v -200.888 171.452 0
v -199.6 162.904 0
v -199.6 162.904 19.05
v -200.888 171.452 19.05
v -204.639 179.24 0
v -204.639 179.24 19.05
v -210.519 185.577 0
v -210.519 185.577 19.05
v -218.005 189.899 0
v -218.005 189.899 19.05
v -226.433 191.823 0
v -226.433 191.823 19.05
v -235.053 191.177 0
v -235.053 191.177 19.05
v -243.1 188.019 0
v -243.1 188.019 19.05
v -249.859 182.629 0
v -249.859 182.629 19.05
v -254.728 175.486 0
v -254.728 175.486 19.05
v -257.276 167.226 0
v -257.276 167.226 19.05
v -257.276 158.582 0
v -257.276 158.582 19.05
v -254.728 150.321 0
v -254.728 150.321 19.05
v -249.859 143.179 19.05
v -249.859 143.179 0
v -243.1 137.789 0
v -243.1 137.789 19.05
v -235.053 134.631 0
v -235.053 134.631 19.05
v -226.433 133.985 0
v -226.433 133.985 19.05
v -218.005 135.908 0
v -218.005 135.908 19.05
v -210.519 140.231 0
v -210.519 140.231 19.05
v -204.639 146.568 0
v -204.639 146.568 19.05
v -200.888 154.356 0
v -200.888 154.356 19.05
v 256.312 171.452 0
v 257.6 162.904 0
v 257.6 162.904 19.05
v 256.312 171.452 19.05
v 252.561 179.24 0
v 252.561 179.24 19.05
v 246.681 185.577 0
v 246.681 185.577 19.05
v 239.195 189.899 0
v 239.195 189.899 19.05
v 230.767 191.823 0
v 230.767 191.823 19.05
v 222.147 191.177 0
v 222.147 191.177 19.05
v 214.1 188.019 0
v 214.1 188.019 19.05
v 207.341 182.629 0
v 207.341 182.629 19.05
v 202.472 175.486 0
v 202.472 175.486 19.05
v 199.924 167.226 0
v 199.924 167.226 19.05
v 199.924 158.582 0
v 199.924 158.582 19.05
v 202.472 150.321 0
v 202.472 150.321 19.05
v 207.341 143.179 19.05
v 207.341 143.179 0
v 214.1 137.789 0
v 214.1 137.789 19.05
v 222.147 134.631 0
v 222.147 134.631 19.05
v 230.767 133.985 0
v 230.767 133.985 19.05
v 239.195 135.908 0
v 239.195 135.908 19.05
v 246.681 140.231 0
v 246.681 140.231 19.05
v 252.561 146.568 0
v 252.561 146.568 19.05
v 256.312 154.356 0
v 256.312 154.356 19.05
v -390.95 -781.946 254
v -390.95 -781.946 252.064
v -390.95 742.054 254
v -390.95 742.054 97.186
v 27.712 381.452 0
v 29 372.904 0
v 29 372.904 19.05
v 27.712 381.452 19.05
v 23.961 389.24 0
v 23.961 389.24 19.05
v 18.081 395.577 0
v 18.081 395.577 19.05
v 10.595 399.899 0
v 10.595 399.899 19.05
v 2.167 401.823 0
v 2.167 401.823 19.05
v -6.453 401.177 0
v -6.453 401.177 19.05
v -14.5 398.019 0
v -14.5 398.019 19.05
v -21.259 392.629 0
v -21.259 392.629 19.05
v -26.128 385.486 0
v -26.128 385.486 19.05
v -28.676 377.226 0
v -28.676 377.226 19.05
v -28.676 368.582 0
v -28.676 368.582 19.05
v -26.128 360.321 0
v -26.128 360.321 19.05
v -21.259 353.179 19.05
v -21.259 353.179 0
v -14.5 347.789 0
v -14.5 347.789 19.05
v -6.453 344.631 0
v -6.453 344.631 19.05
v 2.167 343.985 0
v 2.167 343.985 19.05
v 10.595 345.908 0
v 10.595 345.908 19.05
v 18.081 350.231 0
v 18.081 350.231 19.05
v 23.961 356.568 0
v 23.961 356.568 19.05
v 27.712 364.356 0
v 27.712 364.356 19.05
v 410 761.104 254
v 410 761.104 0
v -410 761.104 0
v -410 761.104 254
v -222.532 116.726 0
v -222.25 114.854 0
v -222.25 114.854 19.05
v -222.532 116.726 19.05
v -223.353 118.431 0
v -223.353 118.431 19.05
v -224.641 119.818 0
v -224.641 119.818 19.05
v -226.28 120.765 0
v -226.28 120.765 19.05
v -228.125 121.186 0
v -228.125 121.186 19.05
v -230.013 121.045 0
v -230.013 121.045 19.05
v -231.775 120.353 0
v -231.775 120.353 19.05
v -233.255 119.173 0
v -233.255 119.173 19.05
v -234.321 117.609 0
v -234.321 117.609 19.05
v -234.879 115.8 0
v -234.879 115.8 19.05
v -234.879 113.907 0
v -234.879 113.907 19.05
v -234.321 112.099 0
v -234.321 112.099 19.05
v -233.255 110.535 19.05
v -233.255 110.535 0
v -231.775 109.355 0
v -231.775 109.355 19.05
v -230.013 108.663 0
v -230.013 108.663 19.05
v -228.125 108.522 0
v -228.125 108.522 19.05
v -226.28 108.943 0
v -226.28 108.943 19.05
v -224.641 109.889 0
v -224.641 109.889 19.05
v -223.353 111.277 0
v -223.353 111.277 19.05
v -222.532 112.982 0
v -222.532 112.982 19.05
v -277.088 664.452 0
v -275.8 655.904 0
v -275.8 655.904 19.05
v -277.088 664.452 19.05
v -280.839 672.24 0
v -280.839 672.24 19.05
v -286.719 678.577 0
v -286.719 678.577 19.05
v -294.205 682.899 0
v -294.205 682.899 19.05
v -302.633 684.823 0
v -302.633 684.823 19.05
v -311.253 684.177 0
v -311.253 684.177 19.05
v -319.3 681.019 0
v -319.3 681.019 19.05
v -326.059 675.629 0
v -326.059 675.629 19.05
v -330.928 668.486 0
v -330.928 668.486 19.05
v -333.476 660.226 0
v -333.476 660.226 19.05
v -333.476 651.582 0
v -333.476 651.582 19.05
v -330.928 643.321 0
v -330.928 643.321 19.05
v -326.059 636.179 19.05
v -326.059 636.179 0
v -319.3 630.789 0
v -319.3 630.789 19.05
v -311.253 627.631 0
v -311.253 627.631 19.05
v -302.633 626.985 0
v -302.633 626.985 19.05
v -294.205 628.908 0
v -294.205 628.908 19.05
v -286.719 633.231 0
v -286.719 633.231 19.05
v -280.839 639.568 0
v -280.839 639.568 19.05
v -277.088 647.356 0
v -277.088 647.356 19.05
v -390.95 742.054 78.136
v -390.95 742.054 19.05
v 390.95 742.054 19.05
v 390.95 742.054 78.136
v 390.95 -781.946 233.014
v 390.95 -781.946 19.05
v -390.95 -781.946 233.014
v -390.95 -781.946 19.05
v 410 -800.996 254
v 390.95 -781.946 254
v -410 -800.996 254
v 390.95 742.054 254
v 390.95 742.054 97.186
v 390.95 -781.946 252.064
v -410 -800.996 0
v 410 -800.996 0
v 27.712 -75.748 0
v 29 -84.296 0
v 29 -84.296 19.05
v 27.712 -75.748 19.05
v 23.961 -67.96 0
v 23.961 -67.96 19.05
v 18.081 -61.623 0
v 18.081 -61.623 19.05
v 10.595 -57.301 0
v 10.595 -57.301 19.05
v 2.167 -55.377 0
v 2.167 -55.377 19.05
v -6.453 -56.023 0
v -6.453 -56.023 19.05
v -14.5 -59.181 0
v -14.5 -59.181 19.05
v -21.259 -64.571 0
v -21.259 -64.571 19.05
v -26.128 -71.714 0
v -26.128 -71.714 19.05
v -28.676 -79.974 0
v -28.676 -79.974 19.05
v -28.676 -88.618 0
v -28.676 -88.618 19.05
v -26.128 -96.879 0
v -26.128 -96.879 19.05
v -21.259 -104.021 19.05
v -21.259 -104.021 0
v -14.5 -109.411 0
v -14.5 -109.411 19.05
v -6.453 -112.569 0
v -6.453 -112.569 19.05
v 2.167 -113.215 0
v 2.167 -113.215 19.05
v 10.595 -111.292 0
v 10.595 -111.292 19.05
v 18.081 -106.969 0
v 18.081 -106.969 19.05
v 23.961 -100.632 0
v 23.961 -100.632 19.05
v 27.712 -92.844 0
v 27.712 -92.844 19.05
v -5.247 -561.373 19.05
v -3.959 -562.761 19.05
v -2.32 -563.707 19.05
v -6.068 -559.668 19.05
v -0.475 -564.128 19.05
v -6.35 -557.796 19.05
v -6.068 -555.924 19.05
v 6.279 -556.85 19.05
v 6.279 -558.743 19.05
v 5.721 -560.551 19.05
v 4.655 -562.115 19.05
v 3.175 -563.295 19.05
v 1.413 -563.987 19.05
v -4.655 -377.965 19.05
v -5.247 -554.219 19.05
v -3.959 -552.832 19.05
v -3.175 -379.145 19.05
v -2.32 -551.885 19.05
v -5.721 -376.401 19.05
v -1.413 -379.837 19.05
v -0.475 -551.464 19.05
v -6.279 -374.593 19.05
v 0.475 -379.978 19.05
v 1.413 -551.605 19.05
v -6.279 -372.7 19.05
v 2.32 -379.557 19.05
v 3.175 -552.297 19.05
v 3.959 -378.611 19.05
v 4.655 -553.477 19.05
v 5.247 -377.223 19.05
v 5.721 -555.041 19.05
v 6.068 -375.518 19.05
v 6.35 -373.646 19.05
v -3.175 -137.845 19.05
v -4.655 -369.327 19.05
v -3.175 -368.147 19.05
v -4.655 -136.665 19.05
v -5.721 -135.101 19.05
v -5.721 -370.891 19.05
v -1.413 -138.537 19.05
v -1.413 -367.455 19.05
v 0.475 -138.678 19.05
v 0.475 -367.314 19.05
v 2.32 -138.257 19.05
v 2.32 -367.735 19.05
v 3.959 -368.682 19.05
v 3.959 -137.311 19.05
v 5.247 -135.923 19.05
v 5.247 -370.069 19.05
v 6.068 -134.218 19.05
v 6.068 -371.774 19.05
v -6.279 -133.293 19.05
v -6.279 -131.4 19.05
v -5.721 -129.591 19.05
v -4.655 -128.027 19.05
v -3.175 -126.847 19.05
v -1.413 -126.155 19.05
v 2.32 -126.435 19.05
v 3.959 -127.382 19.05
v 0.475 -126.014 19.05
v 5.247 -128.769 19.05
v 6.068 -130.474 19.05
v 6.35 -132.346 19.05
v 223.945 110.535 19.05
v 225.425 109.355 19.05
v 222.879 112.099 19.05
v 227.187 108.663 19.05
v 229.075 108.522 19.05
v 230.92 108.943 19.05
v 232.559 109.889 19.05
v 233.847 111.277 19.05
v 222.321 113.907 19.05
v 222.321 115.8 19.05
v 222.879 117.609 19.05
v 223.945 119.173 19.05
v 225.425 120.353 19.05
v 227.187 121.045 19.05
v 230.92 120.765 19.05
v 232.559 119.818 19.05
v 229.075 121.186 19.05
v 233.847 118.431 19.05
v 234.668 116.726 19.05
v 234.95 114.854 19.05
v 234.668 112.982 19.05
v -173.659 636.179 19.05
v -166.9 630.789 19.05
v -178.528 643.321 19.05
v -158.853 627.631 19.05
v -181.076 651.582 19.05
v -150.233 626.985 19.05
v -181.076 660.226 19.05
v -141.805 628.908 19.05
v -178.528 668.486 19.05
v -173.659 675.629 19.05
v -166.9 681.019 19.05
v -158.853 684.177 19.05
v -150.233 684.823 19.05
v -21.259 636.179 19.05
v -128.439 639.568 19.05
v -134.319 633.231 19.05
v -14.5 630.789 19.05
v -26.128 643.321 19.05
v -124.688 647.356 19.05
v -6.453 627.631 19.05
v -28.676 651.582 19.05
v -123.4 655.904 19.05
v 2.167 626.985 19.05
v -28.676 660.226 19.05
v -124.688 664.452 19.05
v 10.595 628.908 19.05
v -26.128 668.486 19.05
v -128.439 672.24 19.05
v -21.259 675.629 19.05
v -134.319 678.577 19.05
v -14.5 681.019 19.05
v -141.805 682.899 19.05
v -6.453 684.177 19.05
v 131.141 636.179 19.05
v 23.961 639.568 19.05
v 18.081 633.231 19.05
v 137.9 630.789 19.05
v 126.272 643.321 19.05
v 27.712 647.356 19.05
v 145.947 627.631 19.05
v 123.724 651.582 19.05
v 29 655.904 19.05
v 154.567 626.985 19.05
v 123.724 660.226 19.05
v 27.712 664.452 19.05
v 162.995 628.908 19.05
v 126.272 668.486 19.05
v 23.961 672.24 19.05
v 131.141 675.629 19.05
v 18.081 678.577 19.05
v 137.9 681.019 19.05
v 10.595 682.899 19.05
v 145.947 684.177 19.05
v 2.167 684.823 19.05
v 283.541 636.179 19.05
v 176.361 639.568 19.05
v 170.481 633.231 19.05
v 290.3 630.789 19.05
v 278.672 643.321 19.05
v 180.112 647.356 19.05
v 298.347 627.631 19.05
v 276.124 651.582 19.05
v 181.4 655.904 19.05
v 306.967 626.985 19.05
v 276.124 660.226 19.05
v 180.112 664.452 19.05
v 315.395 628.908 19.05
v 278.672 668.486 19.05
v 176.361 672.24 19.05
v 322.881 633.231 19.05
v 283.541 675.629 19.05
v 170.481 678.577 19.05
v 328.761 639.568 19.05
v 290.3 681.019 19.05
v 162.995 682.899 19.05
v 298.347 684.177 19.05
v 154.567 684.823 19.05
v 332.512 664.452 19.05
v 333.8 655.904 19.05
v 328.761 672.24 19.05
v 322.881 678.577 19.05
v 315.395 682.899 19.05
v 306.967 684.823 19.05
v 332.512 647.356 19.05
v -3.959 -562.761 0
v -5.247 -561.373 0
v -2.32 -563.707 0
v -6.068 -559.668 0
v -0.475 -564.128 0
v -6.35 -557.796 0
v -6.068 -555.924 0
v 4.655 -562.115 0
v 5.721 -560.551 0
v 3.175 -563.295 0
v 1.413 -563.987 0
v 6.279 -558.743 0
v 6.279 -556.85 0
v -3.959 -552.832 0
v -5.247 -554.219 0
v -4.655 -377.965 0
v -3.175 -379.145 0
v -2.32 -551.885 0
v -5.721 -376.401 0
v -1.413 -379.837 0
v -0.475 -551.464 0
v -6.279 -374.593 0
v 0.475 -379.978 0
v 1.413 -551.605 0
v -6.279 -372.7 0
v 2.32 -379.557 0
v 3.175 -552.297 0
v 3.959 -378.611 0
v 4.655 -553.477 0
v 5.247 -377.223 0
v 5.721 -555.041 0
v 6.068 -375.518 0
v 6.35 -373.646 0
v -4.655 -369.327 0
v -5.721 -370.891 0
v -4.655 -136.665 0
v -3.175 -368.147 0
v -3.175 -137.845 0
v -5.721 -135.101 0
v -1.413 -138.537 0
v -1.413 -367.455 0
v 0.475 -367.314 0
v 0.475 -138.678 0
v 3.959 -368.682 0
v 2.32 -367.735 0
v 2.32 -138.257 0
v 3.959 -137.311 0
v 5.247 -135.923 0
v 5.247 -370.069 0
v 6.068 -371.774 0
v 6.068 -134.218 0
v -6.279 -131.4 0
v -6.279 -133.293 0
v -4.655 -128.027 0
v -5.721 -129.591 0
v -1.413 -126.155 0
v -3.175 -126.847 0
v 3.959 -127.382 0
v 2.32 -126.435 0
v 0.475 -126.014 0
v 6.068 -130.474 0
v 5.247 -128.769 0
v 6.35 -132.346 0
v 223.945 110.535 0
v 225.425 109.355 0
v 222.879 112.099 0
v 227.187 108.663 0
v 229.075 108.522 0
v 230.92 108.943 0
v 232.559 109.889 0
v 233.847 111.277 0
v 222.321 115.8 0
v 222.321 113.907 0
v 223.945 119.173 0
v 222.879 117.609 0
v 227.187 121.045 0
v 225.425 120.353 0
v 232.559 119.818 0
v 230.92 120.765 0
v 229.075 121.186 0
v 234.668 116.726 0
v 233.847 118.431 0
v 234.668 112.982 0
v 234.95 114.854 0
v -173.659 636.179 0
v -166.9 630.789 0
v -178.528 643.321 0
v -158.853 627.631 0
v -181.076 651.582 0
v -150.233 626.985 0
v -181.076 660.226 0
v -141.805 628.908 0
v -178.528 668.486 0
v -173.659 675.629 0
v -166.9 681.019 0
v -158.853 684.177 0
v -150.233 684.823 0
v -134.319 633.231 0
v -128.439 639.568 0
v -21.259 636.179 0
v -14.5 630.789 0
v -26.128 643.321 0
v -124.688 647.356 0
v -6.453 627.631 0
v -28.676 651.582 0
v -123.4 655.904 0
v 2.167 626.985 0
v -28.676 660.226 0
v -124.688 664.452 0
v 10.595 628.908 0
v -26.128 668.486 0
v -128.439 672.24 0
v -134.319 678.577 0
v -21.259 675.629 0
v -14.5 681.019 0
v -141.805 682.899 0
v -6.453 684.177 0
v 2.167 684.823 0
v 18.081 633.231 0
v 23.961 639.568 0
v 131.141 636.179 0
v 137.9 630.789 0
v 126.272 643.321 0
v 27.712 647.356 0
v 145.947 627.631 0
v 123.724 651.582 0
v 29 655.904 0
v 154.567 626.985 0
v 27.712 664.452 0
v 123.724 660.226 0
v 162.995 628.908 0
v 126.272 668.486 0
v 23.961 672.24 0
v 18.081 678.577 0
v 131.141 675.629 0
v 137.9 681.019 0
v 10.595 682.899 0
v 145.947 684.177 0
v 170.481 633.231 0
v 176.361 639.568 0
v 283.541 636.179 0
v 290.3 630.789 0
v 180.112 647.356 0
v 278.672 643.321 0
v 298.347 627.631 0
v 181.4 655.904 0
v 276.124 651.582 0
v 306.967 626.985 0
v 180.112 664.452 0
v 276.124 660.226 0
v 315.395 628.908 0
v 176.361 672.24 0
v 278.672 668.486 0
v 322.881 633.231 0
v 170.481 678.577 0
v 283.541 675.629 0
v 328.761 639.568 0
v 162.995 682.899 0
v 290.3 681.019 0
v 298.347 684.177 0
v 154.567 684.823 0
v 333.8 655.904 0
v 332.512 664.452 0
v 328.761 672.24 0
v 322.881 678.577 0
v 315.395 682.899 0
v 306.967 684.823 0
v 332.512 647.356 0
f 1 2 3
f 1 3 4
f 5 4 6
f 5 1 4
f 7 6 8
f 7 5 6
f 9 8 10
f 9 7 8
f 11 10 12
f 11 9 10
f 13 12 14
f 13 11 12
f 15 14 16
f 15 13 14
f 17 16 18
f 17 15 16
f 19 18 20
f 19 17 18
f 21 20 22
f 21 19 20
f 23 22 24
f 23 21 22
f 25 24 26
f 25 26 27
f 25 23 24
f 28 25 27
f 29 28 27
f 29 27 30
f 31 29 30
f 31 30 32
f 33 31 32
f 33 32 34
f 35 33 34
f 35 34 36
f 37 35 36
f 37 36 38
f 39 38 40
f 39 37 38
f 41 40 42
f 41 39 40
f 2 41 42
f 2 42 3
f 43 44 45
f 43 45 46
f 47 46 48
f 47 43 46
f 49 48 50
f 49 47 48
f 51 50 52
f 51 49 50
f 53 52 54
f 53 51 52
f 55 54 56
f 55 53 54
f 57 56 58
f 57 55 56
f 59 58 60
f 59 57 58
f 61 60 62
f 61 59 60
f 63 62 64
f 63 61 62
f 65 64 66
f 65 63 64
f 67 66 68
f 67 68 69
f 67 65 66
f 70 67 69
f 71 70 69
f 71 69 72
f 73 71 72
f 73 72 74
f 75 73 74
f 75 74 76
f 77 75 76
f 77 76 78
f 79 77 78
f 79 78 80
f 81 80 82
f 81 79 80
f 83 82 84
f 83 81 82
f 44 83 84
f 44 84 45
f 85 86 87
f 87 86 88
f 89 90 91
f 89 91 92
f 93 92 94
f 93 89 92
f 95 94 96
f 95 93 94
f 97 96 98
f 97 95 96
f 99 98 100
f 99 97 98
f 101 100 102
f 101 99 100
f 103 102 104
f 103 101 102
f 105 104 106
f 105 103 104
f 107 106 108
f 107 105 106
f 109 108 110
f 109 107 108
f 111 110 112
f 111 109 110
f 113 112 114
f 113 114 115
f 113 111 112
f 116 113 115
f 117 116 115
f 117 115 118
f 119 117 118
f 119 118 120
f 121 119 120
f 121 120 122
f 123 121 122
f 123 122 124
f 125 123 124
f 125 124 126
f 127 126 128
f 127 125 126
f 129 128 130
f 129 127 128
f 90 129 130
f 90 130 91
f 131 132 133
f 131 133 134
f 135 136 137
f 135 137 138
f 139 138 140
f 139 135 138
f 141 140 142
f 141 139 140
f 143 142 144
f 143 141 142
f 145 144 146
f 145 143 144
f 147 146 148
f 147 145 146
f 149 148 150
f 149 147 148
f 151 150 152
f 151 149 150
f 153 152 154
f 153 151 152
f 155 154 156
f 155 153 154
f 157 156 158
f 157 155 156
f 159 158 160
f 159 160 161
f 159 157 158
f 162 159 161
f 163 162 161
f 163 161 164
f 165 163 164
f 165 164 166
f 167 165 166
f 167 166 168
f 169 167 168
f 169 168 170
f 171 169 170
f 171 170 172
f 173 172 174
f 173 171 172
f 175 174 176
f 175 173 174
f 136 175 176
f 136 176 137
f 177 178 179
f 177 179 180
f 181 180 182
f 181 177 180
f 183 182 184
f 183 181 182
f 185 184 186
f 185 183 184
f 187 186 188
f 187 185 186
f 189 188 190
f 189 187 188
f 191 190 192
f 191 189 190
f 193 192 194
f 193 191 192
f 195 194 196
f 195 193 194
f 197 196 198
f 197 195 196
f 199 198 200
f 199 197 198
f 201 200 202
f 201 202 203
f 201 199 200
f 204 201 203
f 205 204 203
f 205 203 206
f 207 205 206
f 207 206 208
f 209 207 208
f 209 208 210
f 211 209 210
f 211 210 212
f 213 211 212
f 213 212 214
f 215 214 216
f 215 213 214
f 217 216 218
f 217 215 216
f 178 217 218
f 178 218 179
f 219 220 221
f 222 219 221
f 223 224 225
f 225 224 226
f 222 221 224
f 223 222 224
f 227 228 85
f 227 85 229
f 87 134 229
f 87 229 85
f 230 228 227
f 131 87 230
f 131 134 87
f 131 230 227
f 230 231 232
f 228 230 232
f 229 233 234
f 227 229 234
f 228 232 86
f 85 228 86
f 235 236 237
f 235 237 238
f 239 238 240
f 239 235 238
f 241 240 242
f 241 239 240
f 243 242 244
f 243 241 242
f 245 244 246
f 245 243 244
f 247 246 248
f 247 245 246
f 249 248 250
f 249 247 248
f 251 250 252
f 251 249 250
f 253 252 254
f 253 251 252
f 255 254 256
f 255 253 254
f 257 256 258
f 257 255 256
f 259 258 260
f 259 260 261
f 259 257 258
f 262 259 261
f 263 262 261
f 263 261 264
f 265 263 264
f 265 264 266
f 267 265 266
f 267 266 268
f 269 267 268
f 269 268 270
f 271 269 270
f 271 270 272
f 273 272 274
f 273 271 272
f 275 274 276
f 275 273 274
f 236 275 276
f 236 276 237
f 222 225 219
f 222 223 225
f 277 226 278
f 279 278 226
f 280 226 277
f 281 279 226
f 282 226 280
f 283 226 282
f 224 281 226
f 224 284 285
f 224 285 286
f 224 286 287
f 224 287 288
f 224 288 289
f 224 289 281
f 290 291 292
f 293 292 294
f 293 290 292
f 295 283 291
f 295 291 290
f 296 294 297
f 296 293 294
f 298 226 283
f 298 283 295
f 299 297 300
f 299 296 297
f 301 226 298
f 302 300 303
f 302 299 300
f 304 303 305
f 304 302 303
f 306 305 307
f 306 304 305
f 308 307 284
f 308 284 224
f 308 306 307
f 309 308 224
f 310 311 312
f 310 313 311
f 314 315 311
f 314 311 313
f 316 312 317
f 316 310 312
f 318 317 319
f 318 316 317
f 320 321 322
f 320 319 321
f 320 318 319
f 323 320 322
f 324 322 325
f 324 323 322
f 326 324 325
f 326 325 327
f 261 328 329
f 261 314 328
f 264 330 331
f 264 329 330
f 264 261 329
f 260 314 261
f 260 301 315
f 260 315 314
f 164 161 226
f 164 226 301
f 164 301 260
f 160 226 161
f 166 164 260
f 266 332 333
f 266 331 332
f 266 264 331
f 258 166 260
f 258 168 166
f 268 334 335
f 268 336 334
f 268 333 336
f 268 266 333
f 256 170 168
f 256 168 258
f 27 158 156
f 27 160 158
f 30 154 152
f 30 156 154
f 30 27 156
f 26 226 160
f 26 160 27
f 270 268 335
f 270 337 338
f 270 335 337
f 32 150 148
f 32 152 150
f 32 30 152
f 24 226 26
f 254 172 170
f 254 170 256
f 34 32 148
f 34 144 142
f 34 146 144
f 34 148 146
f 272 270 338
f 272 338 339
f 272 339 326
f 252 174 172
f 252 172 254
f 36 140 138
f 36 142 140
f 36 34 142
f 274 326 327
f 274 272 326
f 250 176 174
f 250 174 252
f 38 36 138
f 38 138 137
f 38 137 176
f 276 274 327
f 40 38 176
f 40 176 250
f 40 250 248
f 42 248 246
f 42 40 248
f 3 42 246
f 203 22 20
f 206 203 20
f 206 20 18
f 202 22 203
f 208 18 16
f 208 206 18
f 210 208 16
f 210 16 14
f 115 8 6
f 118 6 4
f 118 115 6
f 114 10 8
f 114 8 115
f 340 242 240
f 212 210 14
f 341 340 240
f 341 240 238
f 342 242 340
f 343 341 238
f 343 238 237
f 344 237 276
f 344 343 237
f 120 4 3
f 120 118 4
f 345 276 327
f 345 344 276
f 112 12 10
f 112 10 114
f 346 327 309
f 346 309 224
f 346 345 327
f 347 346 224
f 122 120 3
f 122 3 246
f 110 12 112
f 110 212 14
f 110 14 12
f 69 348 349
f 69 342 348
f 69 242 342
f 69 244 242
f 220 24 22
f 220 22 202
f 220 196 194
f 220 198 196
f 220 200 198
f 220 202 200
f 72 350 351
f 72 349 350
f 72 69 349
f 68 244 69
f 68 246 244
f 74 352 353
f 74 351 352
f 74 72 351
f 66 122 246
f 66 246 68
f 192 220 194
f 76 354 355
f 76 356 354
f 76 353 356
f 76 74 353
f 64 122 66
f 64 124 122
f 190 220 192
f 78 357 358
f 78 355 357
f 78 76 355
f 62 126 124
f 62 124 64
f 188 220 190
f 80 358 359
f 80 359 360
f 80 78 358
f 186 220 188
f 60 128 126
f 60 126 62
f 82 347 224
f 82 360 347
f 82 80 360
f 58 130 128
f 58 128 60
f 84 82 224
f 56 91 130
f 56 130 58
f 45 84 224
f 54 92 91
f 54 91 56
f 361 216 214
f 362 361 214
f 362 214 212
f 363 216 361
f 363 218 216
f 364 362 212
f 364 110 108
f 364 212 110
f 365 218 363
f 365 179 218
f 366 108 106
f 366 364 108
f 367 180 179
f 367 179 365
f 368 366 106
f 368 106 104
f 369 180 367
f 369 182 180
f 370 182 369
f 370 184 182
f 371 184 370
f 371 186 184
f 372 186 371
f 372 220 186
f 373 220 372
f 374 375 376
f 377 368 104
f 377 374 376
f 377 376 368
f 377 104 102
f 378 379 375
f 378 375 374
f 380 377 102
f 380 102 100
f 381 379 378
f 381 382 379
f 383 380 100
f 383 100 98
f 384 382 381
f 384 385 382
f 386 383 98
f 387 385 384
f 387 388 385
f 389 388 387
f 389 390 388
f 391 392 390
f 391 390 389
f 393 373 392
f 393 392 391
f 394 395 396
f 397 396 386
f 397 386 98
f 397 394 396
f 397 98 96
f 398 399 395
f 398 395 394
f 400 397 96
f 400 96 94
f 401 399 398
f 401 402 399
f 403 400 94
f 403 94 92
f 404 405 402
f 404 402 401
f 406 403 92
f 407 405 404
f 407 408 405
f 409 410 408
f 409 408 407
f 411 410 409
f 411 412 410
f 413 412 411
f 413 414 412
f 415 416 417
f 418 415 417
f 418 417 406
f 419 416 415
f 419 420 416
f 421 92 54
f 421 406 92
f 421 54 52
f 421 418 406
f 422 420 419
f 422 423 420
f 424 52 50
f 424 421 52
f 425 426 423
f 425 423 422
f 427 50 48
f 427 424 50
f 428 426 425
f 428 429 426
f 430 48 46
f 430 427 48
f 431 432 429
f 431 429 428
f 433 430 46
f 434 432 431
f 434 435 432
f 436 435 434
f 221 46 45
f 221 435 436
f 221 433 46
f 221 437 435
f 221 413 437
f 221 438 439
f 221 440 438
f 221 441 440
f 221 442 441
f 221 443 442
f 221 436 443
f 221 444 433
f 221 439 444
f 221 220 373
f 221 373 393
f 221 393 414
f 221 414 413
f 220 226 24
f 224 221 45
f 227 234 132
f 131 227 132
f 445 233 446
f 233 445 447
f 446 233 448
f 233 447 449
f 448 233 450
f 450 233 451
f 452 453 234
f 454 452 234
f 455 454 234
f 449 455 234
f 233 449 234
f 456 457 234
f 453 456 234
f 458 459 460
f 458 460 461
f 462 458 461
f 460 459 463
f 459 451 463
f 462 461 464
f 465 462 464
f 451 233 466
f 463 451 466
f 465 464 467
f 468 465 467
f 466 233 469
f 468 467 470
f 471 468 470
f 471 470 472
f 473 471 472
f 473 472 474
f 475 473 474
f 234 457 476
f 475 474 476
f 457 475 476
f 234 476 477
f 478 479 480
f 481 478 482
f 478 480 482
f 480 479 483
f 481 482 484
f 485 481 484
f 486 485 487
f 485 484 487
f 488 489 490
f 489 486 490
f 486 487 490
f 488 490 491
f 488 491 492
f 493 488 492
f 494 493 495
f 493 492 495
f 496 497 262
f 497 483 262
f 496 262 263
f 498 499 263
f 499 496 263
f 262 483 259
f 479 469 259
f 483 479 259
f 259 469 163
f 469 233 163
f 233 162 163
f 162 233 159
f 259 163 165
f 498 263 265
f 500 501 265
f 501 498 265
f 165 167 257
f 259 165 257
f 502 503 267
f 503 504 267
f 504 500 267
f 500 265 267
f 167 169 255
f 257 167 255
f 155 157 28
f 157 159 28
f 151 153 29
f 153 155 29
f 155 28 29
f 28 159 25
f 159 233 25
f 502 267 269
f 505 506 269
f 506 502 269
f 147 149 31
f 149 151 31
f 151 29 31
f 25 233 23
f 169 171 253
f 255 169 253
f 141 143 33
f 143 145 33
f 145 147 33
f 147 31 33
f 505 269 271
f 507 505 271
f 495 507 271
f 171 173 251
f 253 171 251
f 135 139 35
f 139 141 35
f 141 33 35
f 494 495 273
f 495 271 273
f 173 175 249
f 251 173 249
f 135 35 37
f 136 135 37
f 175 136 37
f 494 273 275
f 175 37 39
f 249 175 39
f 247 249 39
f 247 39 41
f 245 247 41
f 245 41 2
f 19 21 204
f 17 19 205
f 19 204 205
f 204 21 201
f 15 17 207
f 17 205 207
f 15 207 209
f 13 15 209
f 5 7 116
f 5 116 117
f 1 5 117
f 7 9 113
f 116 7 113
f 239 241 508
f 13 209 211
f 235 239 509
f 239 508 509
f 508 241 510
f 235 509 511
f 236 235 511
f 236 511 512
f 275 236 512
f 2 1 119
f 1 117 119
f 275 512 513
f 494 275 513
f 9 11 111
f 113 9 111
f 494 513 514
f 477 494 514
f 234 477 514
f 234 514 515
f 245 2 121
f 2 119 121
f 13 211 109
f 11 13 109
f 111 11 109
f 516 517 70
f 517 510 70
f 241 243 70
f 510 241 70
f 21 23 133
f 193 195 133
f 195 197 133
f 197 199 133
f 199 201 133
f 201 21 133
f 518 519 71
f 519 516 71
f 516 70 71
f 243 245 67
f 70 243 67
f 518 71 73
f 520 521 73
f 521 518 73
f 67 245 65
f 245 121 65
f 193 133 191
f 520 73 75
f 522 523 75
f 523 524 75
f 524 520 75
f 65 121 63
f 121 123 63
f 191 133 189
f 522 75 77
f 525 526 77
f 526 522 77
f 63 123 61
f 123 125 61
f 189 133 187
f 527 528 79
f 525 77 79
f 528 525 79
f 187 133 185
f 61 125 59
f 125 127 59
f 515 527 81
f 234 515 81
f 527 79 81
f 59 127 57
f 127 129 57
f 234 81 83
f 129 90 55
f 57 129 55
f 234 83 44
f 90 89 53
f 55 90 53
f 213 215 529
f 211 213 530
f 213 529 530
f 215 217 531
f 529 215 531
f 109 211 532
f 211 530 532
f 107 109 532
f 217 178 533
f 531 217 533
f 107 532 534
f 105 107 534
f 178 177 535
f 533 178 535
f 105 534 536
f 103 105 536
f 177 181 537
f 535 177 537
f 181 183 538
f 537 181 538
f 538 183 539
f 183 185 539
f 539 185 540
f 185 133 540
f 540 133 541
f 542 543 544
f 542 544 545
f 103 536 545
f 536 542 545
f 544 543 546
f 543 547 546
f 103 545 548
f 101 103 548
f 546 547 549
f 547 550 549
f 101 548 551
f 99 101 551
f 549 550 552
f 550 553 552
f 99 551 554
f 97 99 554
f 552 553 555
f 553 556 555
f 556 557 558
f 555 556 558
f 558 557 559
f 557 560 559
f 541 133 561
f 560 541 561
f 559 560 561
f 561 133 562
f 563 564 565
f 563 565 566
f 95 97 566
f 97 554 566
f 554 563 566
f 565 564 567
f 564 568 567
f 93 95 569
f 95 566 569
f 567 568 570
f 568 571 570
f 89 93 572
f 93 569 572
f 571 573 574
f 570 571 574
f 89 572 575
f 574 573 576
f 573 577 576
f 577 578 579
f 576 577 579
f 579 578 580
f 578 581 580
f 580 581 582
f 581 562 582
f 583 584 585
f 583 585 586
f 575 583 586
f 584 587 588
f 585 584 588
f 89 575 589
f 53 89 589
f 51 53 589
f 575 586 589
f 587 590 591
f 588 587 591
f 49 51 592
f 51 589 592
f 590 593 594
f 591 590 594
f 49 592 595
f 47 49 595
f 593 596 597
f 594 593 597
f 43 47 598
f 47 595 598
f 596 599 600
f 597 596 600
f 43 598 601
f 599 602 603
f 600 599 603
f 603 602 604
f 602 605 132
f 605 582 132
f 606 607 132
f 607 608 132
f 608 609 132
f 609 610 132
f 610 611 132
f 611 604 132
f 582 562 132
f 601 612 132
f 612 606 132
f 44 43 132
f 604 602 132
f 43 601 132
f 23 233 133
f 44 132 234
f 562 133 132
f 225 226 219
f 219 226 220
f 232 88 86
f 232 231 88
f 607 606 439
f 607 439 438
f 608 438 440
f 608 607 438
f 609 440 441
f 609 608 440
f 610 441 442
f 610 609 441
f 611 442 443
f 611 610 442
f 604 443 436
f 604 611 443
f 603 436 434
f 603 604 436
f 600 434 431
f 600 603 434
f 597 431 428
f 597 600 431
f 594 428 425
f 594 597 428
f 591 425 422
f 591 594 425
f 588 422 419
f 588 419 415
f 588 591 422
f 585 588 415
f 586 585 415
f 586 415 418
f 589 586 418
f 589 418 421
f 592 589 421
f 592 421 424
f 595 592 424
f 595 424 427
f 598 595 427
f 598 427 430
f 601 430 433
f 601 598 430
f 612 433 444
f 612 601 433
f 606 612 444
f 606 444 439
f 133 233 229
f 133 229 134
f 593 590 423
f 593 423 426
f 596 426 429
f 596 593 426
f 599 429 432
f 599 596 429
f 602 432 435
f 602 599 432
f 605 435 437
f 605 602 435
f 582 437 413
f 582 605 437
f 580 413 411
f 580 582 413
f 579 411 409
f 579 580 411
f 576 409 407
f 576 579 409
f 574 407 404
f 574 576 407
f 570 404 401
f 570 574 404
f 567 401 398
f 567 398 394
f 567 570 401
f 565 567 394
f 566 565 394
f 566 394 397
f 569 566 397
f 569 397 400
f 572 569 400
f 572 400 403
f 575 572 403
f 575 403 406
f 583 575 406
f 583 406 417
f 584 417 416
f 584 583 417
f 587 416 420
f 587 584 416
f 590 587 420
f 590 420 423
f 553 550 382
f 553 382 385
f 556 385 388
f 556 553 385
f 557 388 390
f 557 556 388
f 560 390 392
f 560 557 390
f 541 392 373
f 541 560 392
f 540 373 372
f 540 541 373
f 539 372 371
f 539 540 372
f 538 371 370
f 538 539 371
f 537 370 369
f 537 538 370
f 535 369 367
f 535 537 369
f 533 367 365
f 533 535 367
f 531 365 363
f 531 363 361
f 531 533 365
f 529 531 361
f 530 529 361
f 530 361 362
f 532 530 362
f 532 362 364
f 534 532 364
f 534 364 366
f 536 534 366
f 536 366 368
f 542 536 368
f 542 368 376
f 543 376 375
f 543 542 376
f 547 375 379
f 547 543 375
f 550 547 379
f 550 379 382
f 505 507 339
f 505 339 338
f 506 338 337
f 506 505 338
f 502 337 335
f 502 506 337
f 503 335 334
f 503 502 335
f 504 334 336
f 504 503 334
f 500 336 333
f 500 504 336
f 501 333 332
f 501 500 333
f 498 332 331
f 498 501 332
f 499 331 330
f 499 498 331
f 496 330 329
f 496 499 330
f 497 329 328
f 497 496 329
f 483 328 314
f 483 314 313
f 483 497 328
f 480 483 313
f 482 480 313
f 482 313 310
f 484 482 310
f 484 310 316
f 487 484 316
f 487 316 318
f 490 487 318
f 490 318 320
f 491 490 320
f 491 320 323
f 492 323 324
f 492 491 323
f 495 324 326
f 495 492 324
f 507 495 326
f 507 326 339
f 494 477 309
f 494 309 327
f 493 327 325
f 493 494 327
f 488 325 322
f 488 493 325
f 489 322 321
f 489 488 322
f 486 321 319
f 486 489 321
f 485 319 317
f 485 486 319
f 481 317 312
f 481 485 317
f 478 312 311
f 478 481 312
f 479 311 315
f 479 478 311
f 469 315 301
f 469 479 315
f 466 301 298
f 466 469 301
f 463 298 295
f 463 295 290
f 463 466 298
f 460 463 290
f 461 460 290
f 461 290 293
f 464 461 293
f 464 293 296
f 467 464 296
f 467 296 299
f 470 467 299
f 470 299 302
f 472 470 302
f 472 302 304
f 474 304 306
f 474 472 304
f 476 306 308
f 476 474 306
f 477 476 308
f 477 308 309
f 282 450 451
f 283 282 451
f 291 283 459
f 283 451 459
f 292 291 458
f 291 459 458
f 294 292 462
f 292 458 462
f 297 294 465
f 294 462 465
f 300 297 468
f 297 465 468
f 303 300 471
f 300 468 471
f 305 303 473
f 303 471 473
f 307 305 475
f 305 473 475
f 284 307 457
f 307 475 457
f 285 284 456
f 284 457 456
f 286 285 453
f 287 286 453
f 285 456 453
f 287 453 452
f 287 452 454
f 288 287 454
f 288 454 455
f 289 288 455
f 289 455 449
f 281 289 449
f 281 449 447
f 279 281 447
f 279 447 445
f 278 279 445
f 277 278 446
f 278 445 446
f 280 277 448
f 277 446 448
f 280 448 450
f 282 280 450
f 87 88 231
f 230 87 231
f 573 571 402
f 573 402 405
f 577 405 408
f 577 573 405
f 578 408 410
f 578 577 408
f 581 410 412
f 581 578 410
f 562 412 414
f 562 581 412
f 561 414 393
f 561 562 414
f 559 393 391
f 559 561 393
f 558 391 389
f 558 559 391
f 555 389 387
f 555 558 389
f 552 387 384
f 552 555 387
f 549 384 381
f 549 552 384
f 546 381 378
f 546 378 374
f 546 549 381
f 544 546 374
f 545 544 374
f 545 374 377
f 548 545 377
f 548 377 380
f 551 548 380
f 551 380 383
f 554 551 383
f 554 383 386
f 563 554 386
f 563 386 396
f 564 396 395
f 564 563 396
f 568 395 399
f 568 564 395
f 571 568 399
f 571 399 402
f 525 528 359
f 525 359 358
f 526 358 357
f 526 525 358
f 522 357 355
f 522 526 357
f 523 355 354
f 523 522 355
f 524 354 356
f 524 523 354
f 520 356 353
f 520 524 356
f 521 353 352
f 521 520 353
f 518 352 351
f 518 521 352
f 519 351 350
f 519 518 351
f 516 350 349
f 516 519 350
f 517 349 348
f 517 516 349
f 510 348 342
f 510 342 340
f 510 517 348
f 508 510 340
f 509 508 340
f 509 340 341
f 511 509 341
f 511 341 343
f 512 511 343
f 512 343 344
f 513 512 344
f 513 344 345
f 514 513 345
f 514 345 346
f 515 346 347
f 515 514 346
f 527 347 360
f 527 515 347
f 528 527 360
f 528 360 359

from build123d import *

# Parameters (mm, degrees)
F0_R     = 6.35
F0_R_2   = 29
F1_DEPTH = 19.05
F0_W     = 820
F0_H     = 1562.1
F2_DEPTH = 254
F4_DEPTH = 819.9882


with BuildPart() as f1:
    # F0 (on Top) → F1 (new body)
    with BuildSketch(Plane.XY):
        with BuildLine():
            Line((-357.9300045967, 709.0338208199), (-357.9300045967, -441.2995662034))
            Line((-357.9300045967, -441.2995662034), (-38.1, -557.7961837769))
            ThreePointArc((-38.1, -557.7961837769), (0, -519.6961837769), (38.1, -557.7961837769))
            Line((38.1, -557.7961837769), (357.9300045967, -441.2995662034))
            Line((357.9300045967, -441.2995662034), (357.9300045967, 709.0338208199))
            Line((357.9300045967, 709.0338208199), (-357.9300045967, 709.0338208199))
        make_face()
        with Locations((0, -373.6461837769)):
            Circle(F0_R, mode=Mode.SUBTRACT)
        with Locations((0, -132.3461837769)):
            Circle(F0_R, mode=Mode.SUBTRACT)
        with Locations((0, -84.2961837769)):
            Circle(F0_R_2, mode=Mode.SUBTRACT)
        with Locations((-228.5999953747, 114.8538155079)):
            Circle(F0_R, mode=Mode.SUBTRACT)
        with Locations((-228.6, 162.9038156998)):
            Circle(F0_R_2, mode=Mode.SUBTRACT)
        with Locations((-304.8, 655.9038162231)):
            Circle(F0_R_2, mode=Mode.SUBTRACT)
        with Locations((-152.4, 655.9038162231)):
            Circle(F0_R_2, mode=Mode.SUBTRACT)
        with Locations((228.5999959257, 114.8538155079)):
            Circle(F0_R, mode=Mode.SUBTRACT)
        with Locations((228.6, 162.9038155079)):
            Circle(F0_R_2, mode=Mode.SUBTRACT)
        with Locations((0, 372.9038162231)):
            Circle(F0_R_2, mode=Mode.SUBTRACT)
        with Locations((0, 655.9038162231)):
            Circle(F0_R_2, mode=Mode.SUBTRACT)
        with Locations((152.4, 655.9038162231)):
            Circle(F0_R_2, mode=Mode.SUBTRACT)
        with Locations((304.8, 655.9038162231)):
            Circle(F0_R_2, mode=Mode.SUBTRACT)
        Polygon((357.9300045967, -557.7961837769), (357.9300045967, -441.2995662034), (38.1, -557.7961837769), align=None)
        Polygon((-38.1, -557.7961837769), (-357.9300045967, -441.2995662034), (-357.9300045967, -557.7961837769), align=None)
        with BuildLine():
            Line((-38.1, -557.7961837769), (-357.9300045967, -557.7961837769))
            Line((-357.9300045967, -557.7961837769), (-357.9300045967, -748.9261883736))
            Line((-357.9300045967, -748.9261883736), (357.9300045967, -748.9261883736))
            Line((357.9300045967, -748.9261883736), (357.9300045967, -557.7961837769))
            Line((357.9300045967, -557.7961837769), (38.1, -557.7961837769))
            Line((38.1, -557.7961837769), (6.35, -557.7961837769))
            ThreePointArc((6.35, -557.7961837769), (0, -564.1461837769), (-6.35, -557.7961837769))
            Line((-6.35, -557.7961837769), (-38.1, -557.7961837769))
        make_face()
        with BuildLine():
            ThreePointArc((38.1, -557.7961837769), (0, -519.6961837769), (-38.1, -557.7961837769))
            Line((-38.1, -557.7961837769), (-6.35, -557.7961837769))
            ThreePointArc((-6.35, -557.7961837769), (0, -551.4461837769), (6.35, -557.7961837769))
            Line((6.35, -557.7961837769), (38.1, -557.7961837769))
        make_face()
        Polygon((390.95, 742.0538162231), (-390.95, 742.0538162231), (-390.95, -429.2721837769), (-357.9300045967, -441.2995662034), (-357.9300045967, 709.0338208199), (357.9300045967, 709.0338208199), (357.9300045967, -441.2995662034), (390.95, -429.2721837769), align=None)
        Polygon((-357.9300045967, -441.2995662034), (-390.95, -429.2721837769), (-390.95, -557.7961837769), (-357.9300045967, -557.7961837769), align=None)
        Polygon((-357.9300045967, -557.7961837769), (-390.95, -557.7961837769), (-390.95, -781.9461837769), (390.95, -781.9461837769), (390.95, -557.7961837769), (357.9300045967, -557.7961837769), (357.9300045967, -748.9261883736), (-357.9300045967, -748.9261883736), align=None)
        Polygon((390.95, -557.7961837769), (390.95, -429.2721837769), (357.9300045967, -441.2995662034), (357.9300045967, -557.7961837769), align=None)
    extrude(amount=F1_DEPTH)

    # F0 (on Top) → F2 (join)
    with BuildSketch(Plane.XY):
        with Locations((0, -19.9461837769)):
            Rectangle(F0_W, F0_H)
        Polygon((-390.95, -429.2721837769), (-390.95, 742.0538162231), (390.95, 742.0538162231), (390.95, -429.2721837769), (390.95, -557.7961837769), (390.95, -781.9461837769), (-390.95, -781.9461837769), (-390.95, -557.7961837769), align=None, mode=Mode.SUBTRACT)
    extrude(amount=F2_DEPTH)

    # F3 (on face) → F4 (join)
    with BuildSketch(Plane.YZ.offset(410)):
        Polygon((-800.9961837769, 234.95), (761.1038162231, 76.2), (761.1038162231, 95.25), (-800.9961837769, 254), align=None)
    extrude(amount=-F4_DEPTH)


solid = f1.part
